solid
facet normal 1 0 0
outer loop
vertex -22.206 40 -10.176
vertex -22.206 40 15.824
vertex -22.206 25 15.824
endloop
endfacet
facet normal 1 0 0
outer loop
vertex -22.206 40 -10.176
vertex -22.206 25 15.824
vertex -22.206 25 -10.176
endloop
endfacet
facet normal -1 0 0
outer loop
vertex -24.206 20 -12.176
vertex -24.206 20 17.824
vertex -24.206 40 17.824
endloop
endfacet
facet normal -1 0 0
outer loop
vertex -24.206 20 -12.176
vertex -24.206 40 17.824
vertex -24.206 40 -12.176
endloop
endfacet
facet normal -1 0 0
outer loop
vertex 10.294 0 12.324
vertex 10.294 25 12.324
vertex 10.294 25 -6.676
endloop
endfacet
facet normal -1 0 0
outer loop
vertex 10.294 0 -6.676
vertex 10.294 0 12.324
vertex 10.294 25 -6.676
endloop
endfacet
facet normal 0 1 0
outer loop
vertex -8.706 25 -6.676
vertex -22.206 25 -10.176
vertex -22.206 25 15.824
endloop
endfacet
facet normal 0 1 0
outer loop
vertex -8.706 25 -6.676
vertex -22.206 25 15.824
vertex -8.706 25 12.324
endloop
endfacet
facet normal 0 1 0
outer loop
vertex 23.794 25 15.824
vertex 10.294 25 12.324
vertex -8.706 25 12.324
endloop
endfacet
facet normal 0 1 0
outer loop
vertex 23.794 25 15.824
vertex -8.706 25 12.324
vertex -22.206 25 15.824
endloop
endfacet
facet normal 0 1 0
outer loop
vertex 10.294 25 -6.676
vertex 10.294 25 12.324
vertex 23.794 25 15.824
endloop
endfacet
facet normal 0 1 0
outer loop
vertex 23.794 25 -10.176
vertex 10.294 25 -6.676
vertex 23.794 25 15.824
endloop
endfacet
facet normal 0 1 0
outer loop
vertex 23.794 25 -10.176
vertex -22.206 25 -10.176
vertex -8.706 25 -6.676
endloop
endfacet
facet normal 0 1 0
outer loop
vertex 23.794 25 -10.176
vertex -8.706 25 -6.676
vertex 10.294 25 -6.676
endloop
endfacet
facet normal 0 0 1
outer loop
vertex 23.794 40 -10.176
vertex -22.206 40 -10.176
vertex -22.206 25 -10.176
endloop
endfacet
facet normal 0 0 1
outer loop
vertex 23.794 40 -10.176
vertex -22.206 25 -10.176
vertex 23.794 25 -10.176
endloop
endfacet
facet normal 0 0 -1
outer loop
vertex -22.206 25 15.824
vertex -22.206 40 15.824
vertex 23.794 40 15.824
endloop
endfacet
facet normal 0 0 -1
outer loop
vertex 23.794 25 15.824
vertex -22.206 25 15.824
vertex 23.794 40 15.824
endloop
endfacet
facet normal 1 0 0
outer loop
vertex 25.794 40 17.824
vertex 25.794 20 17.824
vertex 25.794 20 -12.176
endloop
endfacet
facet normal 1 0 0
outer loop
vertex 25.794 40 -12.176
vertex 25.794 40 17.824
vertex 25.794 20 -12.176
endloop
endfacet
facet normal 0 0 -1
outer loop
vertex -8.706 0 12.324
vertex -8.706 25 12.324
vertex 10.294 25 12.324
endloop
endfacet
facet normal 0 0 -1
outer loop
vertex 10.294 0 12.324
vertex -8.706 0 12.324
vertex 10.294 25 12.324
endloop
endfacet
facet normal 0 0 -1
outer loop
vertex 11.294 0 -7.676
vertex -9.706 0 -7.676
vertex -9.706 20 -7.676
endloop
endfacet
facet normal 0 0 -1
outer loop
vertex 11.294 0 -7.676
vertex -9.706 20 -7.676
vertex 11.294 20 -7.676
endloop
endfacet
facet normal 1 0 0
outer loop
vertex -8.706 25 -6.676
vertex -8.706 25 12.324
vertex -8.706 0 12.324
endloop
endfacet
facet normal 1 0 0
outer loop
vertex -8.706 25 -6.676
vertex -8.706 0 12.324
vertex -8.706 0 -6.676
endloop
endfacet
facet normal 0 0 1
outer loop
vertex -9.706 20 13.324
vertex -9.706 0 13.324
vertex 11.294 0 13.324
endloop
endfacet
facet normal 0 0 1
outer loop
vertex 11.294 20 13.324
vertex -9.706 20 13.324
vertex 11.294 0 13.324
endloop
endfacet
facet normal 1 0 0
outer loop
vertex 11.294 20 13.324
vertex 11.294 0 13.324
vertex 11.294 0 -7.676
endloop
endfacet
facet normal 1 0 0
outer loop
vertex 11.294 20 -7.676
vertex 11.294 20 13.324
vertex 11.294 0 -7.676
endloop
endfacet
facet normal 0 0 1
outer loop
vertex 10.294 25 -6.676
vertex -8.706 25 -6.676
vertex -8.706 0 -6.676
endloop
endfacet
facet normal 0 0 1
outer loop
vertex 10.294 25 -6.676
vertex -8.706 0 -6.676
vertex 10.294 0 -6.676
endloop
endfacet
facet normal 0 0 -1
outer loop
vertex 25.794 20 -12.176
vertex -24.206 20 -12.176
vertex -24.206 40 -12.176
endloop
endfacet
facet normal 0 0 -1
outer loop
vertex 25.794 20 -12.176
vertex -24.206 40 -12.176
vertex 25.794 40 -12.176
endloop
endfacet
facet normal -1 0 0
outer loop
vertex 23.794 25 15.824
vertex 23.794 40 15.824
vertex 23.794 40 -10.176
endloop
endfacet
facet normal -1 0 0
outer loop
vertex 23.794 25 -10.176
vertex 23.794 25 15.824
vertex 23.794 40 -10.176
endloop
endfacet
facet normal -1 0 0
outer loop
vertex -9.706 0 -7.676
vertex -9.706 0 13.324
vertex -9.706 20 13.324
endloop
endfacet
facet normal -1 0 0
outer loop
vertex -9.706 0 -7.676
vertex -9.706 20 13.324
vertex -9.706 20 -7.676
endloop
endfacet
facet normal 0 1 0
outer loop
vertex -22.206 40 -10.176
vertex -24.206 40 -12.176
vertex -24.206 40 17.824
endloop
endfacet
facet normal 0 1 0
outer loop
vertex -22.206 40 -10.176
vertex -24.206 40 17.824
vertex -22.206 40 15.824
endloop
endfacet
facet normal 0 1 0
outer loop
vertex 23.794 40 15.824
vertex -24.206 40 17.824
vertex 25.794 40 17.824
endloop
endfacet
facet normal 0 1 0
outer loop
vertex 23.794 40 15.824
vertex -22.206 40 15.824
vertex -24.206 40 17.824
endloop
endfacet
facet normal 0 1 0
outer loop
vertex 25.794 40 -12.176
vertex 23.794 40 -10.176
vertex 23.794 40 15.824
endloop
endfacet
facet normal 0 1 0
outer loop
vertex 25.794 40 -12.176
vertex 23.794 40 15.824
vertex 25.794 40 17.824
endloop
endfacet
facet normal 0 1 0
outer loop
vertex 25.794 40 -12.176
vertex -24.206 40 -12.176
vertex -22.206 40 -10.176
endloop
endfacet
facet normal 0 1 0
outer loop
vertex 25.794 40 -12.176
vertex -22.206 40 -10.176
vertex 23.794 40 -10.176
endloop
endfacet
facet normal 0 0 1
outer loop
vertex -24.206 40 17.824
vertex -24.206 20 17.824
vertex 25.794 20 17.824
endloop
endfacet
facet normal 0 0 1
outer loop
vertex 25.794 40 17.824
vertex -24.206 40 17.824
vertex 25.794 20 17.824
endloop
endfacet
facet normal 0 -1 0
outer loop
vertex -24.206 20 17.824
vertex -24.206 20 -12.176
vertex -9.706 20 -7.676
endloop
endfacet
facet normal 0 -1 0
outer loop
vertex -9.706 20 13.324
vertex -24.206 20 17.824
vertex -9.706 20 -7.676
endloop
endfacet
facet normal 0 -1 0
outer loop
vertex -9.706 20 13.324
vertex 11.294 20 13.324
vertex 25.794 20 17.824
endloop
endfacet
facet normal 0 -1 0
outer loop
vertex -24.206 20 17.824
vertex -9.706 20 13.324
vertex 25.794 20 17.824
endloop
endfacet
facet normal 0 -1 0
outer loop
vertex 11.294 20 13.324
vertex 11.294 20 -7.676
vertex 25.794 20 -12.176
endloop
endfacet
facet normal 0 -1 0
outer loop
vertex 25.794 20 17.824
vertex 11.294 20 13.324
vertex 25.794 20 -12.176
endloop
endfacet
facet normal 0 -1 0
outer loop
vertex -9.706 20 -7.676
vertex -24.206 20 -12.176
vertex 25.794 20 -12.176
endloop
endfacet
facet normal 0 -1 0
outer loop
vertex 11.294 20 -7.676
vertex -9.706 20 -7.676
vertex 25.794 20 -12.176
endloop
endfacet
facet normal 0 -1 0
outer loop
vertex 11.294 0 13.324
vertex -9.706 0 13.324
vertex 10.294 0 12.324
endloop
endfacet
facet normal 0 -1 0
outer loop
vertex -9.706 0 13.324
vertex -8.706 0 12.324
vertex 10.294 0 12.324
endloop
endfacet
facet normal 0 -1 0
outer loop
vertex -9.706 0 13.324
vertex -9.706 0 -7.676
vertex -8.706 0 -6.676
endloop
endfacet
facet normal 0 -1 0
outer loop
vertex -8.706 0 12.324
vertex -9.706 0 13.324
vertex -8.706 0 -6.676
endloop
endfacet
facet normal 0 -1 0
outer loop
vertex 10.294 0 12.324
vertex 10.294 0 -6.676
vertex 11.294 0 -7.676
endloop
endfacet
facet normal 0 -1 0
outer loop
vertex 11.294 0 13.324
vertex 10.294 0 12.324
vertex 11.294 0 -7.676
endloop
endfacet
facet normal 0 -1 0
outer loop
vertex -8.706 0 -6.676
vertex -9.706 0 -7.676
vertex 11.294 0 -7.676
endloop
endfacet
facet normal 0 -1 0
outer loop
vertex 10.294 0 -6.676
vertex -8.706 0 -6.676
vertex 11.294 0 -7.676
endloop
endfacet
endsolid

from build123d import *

# Parameters (mm, degrees)
SKETCH2_W           = 21
SKETCH2_H           = 21
BOSS_EXTRUDE1_DEPTH = 20
SKETCH3_W           = 19
SKETCH3_H           = 19
CUT_EXTRUDE1_DEPTH  = 21
SKETCH4_W           = 50
SKETCH4_H           = 30
BOSS_EXTRUDE2_DEPTH = 20
SKETCH5_W           = 46
SKETCH5_H           = 26
CUT_EXTRUDE2_DEPTH  = 15
SKETCH6_W           = 19
SKETCH6_H           = 19
CUT_EXTRUDE3_DEPTH  = 15


with BuildPart() as part:
    # Sketch2 → Boss-Extrude1 (new body)
    with BuildSketch(Plane(origin=(0, 0, 0), x_dir=(1, 0, 0), z_dir=(0, 1, 0))):
        with Locations((0.794117647, -2.823529412)):
            Rectangle(SKETCH2_W, SKETCH2_H)
    extrude(amount=BOSS_EXTRUDE1_DEPTH)

    # Sketch3 → Cut-Extrude1 (cut, through all)
    with BuildSketch(Plane(origin=(0, 20, 0), x_dir=(1, 0, 0), z_dir=(0, 1, 0))):
        with Locations((0.794117647, -2.823529412)):
            Rectangle(SKETCH3_W, SKETCH3_H)
    extrude(amount=-CUT_EXTRUDE1_DEPTH, mode=Mode.SUBTRACT)

    # Sketch4 → Boss-Extrude2 (add)
    with BuildSketch(Plane(origin=(0, 20, 0), x_dir=(1, 0, 0), z_dir=(0, 1, 0))):
        with Locations((0.794117647, -2.823529412)):
            Rectangle(SKETCH4_W, SKETCH4_H)
    extrude(amount=BOSS_EXTRUDE2_DEPTH)

    # Sketch5 → Cut-Extrude2 (cut)
    with BuildSketch(Plane(origin=(0, 40, 0), x_dir=(1, 0, 0), z_dir=(0, 1, 0))):
        with Locations((0.794117647, -2.823529412)):
            Rectangle(SKETCH5_W, SKETCH5_H)
    extrude(amount=-CUT_EXTRUDE2_DEPTH, mode=Mode.SUBTRACT)

    # Sketch6 → Cut-Extrude3 (cut)
    with BuildSketch(Plane.XZ.offset(-20)):
        with Locations((0.794117647, 2.823529412)):
            Rectangle(SKETCH6_W, SKETCH6_H)
    extrude(amount=-CUT_EXTRUDE3_DEPTH, mode=Mode.SUBTRACT)


solid = part.part
